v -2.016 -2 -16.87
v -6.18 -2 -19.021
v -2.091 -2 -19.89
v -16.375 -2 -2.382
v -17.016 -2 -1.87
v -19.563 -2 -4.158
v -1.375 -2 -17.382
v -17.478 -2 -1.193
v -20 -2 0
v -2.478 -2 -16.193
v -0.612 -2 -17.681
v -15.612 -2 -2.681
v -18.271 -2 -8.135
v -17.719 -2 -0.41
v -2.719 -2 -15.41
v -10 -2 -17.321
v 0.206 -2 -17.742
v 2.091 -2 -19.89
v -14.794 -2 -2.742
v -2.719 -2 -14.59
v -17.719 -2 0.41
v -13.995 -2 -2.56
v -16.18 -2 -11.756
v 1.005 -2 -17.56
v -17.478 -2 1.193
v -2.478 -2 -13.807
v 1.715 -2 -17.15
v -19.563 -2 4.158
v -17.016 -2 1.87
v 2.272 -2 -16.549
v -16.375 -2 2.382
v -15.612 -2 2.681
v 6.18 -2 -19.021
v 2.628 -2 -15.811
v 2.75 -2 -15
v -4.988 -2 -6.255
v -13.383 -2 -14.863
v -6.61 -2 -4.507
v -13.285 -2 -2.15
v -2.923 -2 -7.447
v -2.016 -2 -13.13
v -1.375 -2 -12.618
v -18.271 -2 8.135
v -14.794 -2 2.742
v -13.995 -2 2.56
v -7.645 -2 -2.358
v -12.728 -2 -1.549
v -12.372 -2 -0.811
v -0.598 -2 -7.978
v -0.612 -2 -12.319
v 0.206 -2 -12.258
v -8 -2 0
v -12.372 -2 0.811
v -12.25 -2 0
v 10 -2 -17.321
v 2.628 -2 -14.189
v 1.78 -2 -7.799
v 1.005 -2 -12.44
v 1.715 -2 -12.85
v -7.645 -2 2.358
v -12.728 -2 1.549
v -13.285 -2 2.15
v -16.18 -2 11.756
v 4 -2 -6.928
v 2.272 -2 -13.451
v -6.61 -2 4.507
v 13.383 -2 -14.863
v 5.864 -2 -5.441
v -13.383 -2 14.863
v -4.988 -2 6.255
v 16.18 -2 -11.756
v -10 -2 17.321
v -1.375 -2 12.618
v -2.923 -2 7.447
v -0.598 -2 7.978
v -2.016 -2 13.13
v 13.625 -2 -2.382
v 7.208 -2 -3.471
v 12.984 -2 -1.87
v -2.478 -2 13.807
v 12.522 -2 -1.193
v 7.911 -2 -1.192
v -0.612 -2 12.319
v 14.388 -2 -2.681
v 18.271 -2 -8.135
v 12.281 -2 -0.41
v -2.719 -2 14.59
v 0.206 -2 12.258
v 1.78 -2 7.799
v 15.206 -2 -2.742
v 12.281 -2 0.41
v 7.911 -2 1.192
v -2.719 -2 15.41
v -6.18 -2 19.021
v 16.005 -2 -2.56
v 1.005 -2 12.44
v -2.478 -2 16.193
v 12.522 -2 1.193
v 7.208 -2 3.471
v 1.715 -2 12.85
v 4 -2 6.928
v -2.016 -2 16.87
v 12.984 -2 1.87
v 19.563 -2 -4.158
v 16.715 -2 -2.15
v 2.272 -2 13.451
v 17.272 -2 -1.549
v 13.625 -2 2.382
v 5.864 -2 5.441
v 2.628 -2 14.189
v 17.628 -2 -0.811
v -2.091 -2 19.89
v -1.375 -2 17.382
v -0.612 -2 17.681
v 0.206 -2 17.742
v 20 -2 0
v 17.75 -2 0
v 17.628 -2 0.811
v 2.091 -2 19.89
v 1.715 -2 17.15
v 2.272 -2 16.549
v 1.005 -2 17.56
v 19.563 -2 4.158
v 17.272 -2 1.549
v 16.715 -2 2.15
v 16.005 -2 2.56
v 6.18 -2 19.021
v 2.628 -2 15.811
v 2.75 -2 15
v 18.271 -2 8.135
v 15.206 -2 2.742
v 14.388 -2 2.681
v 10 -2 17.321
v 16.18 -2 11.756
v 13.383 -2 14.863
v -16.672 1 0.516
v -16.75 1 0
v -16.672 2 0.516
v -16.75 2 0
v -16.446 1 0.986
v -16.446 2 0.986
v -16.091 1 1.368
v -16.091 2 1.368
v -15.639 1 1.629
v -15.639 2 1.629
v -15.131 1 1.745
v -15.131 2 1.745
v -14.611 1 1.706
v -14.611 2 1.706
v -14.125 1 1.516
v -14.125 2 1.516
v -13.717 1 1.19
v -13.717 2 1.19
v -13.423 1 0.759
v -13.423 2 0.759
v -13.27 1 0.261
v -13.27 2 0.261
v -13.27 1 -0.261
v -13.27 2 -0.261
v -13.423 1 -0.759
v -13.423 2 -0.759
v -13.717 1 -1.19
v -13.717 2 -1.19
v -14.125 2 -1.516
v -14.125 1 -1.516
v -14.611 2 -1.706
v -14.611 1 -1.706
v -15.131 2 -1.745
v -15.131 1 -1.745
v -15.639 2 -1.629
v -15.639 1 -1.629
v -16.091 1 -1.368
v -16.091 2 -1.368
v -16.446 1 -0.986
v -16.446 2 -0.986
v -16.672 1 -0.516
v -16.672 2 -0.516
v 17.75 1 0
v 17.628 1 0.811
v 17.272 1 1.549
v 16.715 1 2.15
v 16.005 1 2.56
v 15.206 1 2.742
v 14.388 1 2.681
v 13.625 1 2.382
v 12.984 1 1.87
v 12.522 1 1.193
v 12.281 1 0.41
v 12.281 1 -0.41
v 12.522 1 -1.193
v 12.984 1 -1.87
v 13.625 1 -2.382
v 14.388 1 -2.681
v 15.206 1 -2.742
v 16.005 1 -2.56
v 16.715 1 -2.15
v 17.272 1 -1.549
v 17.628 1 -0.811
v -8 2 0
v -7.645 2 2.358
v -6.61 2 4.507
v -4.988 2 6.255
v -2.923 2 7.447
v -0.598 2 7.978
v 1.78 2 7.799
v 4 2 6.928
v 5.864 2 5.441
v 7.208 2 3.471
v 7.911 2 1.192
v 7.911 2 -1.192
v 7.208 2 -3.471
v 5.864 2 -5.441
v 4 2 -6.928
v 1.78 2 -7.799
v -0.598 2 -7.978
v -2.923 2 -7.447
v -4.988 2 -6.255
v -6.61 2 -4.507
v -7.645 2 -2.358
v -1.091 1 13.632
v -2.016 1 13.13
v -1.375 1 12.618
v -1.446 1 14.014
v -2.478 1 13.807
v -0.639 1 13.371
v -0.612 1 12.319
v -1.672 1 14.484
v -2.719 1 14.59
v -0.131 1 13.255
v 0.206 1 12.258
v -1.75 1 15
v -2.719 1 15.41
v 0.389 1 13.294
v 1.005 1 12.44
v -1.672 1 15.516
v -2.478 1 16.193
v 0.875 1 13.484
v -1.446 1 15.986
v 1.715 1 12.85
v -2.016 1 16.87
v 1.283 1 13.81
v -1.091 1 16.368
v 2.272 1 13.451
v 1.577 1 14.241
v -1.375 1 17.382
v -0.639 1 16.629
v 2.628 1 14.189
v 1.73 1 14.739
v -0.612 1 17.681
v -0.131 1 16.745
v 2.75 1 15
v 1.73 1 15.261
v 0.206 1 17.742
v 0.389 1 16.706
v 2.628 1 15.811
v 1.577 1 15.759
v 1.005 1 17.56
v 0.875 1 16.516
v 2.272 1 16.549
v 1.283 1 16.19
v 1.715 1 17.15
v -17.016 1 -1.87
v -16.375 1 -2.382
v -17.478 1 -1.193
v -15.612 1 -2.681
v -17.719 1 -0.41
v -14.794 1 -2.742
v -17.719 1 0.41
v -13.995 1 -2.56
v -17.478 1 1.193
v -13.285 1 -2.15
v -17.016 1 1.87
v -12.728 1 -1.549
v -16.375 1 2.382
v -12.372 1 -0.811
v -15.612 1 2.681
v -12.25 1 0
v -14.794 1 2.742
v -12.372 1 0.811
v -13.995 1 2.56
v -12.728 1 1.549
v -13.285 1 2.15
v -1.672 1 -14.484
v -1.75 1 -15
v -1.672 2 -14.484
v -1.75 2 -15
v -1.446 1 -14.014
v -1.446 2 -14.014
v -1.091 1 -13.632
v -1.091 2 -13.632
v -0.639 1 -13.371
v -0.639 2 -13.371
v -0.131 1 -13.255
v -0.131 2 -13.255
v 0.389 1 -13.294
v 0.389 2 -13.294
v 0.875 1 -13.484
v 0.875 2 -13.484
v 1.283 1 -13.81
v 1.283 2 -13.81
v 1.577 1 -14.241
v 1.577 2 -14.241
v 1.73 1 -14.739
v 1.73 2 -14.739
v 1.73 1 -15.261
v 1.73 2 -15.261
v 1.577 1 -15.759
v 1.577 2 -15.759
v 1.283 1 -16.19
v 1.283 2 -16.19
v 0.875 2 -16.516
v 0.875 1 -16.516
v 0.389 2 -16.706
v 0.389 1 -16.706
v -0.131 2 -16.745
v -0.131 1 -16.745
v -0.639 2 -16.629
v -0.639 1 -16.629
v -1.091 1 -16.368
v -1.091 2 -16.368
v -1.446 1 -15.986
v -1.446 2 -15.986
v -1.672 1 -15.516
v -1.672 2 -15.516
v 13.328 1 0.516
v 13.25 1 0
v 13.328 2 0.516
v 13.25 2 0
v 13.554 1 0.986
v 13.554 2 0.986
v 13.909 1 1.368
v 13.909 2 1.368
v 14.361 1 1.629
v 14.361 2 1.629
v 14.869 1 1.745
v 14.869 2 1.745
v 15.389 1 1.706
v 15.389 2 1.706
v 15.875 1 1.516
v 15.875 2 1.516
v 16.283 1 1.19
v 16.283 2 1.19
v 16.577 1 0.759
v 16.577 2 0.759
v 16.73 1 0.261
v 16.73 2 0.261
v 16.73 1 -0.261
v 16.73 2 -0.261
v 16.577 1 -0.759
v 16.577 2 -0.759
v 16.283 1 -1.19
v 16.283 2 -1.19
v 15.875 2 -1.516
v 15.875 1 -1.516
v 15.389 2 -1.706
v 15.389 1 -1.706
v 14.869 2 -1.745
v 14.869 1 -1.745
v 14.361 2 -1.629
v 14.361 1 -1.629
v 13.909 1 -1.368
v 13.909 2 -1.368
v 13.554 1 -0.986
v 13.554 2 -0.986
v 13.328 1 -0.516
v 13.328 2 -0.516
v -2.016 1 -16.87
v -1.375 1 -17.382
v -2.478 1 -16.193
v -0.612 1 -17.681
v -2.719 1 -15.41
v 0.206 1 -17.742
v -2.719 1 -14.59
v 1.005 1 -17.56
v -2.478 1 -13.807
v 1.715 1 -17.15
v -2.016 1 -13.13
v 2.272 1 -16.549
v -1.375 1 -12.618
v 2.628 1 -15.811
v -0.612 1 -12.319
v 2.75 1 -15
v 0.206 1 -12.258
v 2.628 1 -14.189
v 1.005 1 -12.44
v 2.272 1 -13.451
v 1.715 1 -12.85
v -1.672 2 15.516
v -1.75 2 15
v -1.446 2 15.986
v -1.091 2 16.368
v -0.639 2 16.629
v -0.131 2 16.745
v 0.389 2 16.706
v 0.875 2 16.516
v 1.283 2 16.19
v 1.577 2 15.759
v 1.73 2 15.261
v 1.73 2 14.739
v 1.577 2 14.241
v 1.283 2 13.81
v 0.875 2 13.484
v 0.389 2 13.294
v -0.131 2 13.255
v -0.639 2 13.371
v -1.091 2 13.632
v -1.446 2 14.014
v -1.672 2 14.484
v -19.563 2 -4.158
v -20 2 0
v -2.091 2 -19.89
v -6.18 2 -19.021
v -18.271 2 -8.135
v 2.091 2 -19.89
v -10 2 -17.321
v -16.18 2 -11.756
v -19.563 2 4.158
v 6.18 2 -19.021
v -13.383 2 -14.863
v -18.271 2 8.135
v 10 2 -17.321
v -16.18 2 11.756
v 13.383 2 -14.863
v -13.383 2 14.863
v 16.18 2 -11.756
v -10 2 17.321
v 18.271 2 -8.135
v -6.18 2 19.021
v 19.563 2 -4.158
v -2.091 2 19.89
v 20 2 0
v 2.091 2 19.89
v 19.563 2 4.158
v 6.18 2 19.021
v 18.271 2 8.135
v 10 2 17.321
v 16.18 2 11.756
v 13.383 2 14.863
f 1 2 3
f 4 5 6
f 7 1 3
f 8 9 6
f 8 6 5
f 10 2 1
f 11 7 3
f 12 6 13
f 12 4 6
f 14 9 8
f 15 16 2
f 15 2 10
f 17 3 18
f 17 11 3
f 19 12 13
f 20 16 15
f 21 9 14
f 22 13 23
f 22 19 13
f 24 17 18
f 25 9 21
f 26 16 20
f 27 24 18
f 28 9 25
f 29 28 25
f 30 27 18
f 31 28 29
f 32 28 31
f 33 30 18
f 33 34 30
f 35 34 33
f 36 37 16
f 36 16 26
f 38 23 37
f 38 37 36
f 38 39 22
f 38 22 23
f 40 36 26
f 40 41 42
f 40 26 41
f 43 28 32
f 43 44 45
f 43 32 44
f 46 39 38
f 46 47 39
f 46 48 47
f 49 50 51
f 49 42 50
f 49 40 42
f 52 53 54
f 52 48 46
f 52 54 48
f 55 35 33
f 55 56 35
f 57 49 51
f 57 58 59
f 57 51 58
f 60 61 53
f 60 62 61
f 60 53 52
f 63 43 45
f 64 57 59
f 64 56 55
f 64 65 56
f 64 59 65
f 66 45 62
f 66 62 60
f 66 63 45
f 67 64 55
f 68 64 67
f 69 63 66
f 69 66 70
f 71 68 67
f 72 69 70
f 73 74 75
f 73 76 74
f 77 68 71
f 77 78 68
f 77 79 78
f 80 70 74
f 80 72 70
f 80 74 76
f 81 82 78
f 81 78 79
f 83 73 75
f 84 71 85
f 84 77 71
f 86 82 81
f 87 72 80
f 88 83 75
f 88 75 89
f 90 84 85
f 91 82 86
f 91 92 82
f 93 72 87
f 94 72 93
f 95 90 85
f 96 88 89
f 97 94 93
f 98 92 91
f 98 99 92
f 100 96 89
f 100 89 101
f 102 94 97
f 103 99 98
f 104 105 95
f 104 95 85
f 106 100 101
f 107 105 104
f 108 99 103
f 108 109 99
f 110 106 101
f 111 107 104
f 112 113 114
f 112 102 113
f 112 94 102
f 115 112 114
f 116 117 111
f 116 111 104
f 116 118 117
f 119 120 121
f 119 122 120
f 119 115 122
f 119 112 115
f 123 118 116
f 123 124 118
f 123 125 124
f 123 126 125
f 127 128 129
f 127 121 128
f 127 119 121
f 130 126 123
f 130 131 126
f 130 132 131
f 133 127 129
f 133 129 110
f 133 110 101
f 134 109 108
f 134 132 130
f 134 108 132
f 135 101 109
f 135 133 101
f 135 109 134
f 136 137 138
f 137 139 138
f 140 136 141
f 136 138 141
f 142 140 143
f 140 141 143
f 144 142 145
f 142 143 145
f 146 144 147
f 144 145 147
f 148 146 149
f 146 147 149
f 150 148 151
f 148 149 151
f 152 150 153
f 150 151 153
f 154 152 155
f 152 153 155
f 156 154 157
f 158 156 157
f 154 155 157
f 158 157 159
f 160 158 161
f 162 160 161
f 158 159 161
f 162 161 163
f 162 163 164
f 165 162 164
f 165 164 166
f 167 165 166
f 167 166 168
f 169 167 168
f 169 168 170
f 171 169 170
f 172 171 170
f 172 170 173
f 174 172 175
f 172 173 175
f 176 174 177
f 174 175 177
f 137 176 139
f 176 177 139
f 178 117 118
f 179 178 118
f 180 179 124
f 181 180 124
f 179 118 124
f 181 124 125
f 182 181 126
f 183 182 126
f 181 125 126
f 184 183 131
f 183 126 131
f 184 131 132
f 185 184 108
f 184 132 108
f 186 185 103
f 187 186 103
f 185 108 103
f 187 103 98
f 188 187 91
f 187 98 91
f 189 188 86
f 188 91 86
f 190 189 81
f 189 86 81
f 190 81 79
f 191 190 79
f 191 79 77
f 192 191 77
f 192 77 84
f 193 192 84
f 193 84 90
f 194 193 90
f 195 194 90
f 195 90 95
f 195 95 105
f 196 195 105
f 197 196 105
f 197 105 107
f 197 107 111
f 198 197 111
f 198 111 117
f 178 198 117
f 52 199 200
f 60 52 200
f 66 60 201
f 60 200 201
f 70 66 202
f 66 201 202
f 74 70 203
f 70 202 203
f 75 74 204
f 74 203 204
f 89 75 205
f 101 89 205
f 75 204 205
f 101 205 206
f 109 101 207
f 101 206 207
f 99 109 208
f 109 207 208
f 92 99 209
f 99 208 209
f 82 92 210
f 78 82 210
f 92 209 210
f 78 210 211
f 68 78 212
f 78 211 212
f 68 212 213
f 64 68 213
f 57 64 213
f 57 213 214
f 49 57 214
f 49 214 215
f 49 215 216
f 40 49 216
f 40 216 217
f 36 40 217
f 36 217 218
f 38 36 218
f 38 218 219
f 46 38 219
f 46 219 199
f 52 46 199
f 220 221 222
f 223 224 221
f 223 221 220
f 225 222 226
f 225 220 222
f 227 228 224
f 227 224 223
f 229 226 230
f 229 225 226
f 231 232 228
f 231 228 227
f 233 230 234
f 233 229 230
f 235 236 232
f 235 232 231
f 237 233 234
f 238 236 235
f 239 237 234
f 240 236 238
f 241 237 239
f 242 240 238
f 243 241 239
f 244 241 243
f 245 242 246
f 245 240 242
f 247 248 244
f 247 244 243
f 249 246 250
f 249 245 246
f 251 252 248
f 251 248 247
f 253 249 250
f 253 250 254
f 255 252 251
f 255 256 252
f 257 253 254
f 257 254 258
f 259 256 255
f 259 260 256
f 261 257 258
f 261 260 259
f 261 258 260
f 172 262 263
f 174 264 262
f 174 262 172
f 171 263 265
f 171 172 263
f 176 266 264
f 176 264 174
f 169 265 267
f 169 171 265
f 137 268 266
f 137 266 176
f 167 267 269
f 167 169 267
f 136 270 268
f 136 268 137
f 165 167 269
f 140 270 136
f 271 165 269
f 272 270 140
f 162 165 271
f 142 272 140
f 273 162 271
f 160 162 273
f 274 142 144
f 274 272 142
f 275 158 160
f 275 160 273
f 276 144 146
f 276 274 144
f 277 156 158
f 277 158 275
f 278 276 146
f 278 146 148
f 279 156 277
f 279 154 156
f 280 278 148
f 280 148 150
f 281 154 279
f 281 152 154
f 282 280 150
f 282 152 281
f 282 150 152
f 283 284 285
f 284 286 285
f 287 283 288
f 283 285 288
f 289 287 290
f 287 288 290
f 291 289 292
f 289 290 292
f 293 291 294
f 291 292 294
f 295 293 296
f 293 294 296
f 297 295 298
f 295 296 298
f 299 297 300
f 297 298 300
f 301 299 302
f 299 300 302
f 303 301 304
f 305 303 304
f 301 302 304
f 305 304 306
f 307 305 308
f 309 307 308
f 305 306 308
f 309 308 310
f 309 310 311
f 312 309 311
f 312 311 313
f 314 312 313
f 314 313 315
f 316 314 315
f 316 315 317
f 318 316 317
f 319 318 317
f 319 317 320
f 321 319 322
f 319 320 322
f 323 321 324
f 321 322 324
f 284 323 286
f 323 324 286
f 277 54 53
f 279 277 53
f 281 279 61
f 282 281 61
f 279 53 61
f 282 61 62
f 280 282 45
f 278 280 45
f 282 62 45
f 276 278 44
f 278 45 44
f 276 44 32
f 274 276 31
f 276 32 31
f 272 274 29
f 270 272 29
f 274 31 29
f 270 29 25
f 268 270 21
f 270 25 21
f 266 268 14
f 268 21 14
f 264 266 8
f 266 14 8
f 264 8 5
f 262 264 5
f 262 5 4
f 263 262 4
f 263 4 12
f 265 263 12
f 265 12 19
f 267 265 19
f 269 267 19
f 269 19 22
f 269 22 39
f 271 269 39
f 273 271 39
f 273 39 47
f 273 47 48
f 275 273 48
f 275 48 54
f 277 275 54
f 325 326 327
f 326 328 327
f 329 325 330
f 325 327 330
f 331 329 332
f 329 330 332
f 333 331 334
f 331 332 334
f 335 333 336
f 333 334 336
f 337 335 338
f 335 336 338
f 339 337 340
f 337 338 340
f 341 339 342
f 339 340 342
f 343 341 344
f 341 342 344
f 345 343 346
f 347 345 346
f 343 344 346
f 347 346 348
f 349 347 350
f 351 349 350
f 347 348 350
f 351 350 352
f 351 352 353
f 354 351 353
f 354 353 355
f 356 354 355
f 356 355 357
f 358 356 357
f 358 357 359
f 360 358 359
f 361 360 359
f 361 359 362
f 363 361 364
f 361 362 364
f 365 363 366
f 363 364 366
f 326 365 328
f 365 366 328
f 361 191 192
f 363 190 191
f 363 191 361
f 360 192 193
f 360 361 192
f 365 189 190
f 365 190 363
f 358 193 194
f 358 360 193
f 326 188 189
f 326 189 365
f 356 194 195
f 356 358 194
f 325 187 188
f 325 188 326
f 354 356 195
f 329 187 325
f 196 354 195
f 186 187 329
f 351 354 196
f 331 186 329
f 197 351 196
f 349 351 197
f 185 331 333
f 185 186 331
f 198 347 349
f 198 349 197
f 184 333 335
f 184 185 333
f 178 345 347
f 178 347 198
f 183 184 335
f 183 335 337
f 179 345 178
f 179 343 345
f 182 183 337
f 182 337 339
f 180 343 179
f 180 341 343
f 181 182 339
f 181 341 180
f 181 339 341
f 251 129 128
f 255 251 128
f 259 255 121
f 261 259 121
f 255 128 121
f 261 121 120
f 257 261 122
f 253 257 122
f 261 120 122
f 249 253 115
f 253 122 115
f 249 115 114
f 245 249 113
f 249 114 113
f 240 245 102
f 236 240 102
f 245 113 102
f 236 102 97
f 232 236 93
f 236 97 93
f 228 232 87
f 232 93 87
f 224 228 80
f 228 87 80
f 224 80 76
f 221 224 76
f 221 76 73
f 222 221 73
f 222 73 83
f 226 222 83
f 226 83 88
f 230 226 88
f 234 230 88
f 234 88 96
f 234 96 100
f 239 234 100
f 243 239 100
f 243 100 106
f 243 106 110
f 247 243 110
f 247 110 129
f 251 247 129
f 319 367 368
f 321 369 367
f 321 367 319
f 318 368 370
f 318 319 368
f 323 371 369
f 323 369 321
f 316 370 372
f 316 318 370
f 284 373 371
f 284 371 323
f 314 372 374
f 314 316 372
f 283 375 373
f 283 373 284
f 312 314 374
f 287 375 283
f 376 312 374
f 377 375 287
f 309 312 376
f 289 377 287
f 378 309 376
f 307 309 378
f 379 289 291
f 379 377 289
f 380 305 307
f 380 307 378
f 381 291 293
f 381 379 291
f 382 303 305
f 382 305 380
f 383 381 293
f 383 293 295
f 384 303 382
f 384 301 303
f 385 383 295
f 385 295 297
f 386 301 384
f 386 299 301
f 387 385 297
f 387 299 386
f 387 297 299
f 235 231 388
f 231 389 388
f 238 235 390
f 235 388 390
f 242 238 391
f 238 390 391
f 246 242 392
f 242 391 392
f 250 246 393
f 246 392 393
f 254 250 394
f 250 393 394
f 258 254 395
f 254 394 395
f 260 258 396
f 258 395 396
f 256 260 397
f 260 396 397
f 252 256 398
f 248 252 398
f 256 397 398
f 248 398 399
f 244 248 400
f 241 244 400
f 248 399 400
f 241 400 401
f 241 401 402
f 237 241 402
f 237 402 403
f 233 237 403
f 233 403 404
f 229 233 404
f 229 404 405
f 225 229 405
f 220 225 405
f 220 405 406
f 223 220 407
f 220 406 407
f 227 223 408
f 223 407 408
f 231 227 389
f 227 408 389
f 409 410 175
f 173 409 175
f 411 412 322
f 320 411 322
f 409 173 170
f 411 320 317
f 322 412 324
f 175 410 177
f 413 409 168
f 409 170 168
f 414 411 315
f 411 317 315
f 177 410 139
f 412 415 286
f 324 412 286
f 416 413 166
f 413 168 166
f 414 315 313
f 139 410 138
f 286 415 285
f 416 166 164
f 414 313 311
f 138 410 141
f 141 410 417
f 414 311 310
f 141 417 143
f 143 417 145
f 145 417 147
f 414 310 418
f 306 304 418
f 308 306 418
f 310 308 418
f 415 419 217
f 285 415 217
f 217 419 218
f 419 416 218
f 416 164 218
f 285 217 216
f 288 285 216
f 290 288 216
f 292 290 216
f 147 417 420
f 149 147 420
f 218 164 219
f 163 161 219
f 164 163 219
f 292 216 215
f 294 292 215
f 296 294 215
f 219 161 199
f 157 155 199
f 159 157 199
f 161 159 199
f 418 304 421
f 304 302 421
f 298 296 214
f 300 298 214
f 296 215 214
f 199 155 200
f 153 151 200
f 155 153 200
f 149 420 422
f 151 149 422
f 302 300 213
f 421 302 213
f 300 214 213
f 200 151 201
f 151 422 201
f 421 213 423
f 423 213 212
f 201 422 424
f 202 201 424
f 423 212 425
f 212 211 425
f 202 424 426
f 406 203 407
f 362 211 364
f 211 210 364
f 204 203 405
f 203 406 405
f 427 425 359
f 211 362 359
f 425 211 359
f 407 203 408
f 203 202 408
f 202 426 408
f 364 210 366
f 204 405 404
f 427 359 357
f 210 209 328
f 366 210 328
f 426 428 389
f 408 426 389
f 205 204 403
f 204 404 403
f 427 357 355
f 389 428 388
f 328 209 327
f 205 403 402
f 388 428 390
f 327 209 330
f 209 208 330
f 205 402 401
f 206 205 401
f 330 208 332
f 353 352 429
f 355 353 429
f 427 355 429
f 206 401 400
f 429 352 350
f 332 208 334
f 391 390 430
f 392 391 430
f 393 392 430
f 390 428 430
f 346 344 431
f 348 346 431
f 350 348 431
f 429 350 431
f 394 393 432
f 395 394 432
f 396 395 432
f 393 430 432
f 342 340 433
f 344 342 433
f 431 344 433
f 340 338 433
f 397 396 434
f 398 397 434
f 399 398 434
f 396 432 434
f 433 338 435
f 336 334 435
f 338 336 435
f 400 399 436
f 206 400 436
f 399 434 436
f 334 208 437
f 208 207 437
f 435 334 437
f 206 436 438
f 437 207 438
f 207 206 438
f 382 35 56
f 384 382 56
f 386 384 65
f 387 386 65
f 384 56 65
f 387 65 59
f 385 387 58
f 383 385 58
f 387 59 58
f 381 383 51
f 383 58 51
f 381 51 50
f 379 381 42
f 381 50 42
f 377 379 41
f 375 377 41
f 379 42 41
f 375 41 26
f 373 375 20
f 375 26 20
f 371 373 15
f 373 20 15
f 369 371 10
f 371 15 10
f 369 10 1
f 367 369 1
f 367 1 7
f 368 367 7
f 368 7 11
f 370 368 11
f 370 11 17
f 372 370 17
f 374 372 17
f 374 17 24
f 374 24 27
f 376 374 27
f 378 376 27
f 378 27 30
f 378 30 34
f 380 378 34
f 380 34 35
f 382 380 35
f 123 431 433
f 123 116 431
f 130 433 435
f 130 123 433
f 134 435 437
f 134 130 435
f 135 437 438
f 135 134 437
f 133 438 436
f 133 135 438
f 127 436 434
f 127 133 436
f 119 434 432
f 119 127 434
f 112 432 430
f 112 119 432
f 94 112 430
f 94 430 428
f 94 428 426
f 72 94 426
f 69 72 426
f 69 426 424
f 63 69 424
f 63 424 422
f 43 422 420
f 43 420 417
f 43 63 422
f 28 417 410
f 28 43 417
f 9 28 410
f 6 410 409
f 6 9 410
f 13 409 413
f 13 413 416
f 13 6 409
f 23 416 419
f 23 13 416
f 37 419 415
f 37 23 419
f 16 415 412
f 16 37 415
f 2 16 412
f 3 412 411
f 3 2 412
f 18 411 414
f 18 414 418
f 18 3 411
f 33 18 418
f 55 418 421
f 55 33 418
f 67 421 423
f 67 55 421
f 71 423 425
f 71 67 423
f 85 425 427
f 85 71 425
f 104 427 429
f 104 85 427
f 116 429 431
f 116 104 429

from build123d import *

# Parameters (mm, degrees)
F0_R           = 20
F1_DEPTH       = 2
F3_D           = 3.5
F3_CBORE_D     = 5.5
F3_CBORE_DEPTH = 3
F4_D           = 16


with BuildPart() as f1:
    # F0 (on Front) → F1 (new body, symmetric)
    with BuildSketch(Plane.XZ):
        Circle(F0_R)
    extrude(amount=F1_DEPTH, both=True)

    # F3 (through all)
    with Locations(Plane.XZ.offset(2)):
        with Locations((0, 15), (-15, 0), (0, -15), (15, 0)):
            CounterBoreHole(F3_D / 2, F3_CBORE_D / 2, F3_CBORE_DEPTH)

    # F4 (through all)
    with Locations(Plane.XZ.offset(2)):
        with Locations((0, 0)):
            Hole(F4_D / 2)


solid = f1.part
